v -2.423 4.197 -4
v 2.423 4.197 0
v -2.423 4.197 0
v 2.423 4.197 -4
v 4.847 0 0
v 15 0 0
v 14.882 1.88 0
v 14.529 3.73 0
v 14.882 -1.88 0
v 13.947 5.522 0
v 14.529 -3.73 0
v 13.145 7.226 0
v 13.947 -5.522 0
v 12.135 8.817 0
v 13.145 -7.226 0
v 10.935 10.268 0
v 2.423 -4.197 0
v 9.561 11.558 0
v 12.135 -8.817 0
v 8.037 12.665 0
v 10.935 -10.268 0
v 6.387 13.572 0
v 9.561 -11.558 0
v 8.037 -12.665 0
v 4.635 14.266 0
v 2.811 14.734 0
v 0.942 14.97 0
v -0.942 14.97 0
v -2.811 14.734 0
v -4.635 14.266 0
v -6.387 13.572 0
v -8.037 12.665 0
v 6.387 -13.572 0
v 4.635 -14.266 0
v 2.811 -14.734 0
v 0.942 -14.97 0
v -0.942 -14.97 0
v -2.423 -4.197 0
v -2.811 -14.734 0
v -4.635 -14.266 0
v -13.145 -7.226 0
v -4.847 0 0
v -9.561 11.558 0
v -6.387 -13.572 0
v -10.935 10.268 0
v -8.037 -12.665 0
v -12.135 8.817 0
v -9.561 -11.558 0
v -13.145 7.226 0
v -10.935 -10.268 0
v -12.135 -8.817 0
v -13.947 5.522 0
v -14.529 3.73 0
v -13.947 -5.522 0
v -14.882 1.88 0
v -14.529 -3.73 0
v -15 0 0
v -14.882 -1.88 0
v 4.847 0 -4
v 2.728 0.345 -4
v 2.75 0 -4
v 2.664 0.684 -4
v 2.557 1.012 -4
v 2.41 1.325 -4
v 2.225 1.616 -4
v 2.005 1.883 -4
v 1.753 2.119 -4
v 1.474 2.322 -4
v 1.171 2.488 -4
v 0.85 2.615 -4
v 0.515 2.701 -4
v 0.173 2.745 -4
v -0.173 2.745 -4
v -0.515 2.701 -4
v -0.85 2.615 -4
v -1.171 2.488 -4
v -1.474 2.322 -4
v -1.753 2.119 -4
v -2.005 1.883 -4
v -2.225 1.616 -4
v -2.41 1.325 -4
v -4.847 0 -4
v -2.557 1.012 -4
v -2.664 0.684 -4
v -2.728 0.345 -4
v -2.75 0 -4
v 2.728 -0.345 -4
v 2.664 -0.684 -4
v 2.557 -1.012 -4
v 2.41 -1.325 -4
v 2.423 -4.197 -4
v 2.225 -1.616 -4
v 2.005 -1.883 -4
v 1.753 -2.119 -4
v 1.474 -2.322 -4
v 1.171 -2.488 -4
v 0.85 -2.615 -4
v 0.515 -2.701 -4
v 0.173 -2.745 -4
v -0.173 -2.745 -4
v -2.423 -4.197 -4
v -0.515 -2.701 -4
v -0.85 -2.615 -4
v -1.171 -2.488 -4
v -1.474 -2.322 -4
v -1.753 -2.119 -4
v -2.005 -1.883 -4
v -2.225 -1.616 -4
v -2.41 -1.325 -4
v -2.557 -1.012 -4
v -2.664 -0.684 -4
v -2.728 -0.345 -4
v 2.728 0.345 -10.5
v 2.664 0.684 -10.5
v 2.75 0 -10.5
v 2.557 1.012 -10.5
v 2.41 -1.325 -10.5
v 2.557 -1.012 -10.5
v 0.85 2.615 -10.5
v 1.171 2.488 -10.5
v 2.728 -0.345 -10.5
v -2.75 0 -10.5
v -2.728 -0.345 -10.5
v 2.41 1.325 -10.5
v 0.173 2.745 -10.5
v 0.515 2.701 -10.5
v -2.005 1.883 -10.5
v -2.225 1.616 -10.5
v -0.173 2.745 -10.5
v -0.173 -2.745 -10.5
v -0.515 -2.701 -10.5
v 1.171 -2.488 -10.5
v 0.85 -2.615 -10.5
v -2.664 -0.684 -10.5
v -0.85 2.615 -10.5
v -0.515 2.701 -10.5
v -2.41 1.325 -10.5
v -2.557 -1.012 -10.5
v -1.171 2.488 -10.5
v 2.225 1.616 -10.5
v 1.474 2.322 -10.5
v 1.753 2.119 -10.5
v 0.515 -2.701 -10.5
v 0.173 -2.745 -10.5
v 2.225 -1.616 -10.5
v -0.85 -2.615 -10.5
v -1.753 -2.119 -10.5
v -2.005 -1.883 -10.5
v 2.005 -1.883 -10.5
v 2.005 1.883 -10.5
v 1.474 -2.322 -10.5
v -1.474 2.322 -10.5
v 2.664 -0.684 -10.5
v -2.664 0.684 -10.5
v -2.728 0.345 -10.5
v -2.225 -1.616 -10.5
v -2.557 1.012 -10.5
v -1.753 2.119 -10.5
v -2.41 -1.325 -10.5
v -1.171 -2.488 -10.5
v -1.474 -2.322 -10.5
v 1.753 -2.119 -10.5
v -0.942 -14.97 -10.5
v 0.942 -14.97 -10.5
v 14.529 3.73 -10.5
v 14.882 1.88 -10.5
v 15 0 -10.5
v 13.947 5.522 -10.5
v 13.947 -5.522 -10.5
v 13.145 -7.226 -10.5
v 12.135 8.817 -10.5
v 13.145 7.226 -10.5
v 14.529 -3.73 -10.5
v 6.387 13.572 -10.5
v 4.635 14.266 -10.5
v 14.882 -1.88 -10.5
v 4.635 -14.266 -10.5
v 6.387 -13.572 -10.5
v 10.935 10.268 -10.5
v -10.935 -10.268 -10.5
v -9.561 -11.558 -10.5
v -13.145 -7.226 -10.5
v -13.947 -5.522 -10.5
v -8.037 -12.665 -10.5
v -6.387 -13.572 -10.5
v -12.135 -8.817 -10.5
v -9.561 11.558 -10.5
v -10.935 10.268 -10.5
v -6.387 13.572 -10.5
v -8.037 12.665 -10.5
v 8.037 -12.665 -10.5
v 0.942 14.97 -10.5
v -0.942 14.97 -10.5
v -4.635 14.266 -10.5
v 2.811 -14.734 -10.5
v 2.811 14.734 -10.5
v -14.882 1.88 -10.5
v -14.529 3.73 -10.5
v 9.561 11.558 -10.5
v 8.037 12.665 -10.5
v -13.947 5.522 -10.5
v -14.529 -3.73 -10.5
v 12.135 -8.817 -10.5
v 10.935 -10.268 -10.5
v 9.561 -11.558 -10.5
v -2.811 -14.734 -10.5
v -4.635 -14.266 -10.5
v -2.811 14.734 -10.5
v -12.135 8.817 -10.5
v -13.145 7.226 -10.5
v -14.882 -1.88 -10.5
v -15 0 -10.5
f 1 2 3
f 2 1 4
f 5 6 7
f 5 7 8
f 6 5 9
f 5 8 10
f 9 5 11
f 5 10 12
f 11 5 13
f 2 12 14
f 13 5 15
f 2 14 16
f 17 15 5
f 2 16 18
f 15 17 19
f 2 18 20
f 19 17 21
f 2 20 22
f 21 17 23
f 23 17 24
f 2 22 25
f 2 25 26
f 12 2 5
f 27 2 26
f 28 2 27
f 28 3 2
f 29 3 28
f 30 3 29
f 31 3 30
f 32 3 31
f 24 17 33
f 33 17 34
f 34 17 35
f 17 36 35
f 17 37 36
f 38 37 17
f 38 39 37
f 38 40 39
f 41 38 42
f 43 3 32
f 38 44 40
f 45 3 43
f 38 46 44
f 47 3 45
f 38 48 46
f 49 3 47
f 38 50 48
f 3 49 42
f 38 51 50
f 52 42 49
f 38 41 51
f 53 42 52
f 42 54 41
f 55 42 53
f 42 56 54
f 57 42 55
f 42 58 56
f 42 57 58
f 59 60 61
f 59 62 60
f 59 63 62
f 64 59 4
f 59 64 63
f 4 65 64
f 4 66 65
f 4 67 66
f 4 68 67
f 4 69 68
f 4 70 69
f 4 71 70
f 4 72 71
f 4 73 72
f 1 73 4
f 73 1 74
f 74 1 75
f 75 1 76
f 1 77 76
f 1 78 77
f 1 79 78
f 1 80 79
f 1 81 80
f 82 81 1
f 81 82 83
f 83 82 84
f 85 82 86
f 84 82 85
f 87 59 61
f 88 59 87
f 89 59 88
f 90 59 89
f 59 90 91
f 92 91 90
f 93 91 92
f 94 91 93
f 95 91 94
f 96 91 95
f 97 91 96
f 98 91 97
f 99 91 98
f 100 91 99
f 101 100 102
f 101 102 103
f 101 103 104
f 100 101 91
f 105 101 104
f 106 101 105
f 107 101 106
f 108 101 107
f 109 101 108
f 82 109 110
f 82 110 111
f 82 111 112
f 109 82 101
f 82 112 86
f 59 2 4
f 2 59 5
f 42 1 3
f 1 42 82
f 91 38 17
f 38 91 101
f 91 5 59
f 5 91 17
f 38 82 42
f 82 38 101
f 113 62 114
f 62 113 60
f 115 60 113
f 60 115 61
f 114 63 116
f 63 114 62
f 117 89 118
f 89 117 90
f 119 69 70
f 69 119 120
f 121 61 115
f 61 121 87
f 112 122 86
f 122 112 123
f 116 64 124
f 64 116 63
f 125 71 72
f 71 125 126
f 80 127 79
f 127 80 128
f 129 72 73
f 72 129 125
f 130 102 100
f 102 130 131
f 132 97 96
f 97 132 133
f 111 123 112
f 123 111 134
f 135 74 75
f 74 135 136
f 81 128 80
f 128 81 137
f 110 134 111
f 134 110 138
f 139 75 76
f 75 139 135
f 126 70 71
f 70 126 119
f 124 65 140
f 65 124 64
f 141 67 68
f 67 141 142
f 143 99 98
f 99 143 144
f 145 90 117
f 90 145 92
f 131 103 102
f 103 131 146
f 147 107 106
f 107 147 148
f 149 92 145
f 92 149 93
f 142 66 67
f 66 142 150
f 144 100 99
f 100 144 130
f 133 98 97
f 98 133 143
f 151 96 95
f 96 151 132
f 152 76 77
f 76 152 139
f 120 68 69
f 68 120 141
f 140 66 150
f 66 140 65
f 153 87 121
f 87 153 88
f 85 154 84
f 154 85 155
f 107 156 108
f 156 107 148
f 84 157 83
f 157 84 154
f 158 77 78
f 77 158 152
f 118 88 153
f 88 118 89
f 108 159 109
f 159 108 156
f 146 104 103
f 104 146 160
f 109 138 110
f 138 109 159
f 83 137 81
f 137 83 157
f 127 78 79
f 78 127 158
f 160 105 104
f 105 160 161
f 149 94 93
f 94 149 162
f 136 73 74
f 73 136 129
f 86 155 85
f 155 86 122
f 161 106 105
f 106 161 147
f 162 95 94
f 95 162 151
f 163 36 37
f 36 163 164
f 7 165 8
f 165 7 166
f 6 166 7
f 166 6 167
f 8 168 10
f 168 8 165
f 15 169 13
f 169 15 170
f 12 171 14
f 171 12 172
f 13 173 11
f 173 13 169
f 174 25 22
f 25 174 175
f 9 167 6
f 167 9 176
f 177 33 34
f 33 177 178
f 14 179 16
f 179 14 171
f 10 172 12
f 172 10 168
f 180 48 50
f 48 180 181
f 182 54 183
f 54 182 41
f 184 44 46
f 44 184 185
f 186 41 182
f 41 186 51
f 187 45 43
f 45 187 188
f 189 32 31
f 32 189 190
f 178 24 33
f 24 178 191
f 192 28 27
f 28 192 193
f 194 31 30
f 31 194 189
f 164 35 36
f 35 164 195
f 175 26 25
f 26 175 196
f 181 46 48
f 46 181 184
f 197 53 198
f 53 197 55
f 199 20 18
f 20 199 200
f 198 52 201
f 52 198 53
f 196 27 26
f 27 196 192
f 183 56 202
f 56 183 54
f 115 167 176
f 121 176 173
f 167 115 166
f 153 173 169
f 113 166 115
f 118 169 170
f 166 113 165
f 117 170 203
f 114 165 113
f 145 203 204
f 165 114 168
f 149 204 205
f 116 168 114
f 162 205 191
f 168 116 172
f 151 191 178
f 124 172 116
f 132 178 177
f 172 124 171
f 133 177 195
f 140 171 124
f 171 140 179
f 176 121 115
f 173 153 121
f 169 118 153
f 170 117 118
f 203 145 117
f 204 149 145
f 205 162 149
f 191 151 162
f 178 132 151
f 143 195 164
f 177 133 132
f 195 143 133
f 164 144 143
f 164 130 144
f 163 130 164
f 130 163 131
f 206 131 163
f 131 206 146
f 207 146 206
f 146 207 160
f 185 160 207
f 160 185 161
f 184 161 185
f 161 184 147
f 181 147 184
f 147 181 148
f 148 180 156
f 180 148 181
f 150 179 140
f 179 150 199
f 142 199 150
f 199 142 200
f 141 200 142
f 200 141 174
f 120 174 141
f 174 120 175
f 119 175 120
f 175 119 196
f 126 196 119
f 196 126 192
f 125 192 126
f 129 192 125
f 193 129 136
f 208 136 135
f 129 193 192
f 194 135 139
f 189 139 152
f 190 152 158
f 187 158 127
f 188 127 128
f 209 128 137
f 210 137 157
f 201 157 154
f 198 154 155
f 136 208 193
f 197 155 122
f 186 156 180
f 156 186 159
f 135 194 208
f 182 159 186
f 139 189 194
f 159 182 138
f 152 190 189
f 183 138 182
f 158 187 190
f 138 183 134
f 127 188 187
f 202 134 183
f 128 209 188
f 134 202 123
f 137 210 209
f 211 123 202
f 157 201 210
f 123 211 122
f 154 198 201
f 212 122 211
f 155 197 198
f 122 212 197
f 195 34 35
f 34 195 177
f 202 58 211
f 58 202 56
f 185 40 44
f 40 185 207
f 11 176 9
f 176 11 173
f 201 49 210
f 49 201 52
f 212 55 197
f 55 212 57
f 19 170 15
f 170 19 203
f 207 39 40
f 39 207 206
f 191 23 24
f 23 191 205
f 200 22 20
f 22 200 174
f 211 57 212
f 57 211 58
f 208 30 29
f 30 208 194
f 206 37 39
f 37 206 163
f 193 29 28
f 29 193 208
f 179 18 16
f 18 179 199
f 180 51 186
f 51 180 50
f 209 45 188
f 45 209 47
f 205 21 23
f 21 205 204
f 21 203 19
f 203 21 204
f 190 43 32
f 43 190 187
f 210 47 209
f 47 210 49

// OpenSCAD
$fn = 50;

difference() {
	union() {
		translate(v = [0, 0, -10.5]) {
			cylinder(h = 10.5, r = 15.0);
		}
	}
	union() {
		translate(v = [0, 0, 0]) {
			rotate(a = [0, 0, 0]) {
				difference() {
					union() {
						translate(v = [0, 0, -4]) {
							linear_extrude(height = 4) {
								polygon(points = [[4.8468, 0.0], [2.4234000000000004, 4.197451927062417], [-2.423399999999999, 4.197451927062417], [-4.8468, 5.935618106107392e-16], [-2.423400000000002, -4.197451927062416], [2.423399999999997, -4.197451927062419]]);
							}
						}
					}
					union();
				}
			}
		}
		#translate(v = [0, 0, -100.0]) {
			cylinder(h = 200, r = 2.75);
		}
	}
}
